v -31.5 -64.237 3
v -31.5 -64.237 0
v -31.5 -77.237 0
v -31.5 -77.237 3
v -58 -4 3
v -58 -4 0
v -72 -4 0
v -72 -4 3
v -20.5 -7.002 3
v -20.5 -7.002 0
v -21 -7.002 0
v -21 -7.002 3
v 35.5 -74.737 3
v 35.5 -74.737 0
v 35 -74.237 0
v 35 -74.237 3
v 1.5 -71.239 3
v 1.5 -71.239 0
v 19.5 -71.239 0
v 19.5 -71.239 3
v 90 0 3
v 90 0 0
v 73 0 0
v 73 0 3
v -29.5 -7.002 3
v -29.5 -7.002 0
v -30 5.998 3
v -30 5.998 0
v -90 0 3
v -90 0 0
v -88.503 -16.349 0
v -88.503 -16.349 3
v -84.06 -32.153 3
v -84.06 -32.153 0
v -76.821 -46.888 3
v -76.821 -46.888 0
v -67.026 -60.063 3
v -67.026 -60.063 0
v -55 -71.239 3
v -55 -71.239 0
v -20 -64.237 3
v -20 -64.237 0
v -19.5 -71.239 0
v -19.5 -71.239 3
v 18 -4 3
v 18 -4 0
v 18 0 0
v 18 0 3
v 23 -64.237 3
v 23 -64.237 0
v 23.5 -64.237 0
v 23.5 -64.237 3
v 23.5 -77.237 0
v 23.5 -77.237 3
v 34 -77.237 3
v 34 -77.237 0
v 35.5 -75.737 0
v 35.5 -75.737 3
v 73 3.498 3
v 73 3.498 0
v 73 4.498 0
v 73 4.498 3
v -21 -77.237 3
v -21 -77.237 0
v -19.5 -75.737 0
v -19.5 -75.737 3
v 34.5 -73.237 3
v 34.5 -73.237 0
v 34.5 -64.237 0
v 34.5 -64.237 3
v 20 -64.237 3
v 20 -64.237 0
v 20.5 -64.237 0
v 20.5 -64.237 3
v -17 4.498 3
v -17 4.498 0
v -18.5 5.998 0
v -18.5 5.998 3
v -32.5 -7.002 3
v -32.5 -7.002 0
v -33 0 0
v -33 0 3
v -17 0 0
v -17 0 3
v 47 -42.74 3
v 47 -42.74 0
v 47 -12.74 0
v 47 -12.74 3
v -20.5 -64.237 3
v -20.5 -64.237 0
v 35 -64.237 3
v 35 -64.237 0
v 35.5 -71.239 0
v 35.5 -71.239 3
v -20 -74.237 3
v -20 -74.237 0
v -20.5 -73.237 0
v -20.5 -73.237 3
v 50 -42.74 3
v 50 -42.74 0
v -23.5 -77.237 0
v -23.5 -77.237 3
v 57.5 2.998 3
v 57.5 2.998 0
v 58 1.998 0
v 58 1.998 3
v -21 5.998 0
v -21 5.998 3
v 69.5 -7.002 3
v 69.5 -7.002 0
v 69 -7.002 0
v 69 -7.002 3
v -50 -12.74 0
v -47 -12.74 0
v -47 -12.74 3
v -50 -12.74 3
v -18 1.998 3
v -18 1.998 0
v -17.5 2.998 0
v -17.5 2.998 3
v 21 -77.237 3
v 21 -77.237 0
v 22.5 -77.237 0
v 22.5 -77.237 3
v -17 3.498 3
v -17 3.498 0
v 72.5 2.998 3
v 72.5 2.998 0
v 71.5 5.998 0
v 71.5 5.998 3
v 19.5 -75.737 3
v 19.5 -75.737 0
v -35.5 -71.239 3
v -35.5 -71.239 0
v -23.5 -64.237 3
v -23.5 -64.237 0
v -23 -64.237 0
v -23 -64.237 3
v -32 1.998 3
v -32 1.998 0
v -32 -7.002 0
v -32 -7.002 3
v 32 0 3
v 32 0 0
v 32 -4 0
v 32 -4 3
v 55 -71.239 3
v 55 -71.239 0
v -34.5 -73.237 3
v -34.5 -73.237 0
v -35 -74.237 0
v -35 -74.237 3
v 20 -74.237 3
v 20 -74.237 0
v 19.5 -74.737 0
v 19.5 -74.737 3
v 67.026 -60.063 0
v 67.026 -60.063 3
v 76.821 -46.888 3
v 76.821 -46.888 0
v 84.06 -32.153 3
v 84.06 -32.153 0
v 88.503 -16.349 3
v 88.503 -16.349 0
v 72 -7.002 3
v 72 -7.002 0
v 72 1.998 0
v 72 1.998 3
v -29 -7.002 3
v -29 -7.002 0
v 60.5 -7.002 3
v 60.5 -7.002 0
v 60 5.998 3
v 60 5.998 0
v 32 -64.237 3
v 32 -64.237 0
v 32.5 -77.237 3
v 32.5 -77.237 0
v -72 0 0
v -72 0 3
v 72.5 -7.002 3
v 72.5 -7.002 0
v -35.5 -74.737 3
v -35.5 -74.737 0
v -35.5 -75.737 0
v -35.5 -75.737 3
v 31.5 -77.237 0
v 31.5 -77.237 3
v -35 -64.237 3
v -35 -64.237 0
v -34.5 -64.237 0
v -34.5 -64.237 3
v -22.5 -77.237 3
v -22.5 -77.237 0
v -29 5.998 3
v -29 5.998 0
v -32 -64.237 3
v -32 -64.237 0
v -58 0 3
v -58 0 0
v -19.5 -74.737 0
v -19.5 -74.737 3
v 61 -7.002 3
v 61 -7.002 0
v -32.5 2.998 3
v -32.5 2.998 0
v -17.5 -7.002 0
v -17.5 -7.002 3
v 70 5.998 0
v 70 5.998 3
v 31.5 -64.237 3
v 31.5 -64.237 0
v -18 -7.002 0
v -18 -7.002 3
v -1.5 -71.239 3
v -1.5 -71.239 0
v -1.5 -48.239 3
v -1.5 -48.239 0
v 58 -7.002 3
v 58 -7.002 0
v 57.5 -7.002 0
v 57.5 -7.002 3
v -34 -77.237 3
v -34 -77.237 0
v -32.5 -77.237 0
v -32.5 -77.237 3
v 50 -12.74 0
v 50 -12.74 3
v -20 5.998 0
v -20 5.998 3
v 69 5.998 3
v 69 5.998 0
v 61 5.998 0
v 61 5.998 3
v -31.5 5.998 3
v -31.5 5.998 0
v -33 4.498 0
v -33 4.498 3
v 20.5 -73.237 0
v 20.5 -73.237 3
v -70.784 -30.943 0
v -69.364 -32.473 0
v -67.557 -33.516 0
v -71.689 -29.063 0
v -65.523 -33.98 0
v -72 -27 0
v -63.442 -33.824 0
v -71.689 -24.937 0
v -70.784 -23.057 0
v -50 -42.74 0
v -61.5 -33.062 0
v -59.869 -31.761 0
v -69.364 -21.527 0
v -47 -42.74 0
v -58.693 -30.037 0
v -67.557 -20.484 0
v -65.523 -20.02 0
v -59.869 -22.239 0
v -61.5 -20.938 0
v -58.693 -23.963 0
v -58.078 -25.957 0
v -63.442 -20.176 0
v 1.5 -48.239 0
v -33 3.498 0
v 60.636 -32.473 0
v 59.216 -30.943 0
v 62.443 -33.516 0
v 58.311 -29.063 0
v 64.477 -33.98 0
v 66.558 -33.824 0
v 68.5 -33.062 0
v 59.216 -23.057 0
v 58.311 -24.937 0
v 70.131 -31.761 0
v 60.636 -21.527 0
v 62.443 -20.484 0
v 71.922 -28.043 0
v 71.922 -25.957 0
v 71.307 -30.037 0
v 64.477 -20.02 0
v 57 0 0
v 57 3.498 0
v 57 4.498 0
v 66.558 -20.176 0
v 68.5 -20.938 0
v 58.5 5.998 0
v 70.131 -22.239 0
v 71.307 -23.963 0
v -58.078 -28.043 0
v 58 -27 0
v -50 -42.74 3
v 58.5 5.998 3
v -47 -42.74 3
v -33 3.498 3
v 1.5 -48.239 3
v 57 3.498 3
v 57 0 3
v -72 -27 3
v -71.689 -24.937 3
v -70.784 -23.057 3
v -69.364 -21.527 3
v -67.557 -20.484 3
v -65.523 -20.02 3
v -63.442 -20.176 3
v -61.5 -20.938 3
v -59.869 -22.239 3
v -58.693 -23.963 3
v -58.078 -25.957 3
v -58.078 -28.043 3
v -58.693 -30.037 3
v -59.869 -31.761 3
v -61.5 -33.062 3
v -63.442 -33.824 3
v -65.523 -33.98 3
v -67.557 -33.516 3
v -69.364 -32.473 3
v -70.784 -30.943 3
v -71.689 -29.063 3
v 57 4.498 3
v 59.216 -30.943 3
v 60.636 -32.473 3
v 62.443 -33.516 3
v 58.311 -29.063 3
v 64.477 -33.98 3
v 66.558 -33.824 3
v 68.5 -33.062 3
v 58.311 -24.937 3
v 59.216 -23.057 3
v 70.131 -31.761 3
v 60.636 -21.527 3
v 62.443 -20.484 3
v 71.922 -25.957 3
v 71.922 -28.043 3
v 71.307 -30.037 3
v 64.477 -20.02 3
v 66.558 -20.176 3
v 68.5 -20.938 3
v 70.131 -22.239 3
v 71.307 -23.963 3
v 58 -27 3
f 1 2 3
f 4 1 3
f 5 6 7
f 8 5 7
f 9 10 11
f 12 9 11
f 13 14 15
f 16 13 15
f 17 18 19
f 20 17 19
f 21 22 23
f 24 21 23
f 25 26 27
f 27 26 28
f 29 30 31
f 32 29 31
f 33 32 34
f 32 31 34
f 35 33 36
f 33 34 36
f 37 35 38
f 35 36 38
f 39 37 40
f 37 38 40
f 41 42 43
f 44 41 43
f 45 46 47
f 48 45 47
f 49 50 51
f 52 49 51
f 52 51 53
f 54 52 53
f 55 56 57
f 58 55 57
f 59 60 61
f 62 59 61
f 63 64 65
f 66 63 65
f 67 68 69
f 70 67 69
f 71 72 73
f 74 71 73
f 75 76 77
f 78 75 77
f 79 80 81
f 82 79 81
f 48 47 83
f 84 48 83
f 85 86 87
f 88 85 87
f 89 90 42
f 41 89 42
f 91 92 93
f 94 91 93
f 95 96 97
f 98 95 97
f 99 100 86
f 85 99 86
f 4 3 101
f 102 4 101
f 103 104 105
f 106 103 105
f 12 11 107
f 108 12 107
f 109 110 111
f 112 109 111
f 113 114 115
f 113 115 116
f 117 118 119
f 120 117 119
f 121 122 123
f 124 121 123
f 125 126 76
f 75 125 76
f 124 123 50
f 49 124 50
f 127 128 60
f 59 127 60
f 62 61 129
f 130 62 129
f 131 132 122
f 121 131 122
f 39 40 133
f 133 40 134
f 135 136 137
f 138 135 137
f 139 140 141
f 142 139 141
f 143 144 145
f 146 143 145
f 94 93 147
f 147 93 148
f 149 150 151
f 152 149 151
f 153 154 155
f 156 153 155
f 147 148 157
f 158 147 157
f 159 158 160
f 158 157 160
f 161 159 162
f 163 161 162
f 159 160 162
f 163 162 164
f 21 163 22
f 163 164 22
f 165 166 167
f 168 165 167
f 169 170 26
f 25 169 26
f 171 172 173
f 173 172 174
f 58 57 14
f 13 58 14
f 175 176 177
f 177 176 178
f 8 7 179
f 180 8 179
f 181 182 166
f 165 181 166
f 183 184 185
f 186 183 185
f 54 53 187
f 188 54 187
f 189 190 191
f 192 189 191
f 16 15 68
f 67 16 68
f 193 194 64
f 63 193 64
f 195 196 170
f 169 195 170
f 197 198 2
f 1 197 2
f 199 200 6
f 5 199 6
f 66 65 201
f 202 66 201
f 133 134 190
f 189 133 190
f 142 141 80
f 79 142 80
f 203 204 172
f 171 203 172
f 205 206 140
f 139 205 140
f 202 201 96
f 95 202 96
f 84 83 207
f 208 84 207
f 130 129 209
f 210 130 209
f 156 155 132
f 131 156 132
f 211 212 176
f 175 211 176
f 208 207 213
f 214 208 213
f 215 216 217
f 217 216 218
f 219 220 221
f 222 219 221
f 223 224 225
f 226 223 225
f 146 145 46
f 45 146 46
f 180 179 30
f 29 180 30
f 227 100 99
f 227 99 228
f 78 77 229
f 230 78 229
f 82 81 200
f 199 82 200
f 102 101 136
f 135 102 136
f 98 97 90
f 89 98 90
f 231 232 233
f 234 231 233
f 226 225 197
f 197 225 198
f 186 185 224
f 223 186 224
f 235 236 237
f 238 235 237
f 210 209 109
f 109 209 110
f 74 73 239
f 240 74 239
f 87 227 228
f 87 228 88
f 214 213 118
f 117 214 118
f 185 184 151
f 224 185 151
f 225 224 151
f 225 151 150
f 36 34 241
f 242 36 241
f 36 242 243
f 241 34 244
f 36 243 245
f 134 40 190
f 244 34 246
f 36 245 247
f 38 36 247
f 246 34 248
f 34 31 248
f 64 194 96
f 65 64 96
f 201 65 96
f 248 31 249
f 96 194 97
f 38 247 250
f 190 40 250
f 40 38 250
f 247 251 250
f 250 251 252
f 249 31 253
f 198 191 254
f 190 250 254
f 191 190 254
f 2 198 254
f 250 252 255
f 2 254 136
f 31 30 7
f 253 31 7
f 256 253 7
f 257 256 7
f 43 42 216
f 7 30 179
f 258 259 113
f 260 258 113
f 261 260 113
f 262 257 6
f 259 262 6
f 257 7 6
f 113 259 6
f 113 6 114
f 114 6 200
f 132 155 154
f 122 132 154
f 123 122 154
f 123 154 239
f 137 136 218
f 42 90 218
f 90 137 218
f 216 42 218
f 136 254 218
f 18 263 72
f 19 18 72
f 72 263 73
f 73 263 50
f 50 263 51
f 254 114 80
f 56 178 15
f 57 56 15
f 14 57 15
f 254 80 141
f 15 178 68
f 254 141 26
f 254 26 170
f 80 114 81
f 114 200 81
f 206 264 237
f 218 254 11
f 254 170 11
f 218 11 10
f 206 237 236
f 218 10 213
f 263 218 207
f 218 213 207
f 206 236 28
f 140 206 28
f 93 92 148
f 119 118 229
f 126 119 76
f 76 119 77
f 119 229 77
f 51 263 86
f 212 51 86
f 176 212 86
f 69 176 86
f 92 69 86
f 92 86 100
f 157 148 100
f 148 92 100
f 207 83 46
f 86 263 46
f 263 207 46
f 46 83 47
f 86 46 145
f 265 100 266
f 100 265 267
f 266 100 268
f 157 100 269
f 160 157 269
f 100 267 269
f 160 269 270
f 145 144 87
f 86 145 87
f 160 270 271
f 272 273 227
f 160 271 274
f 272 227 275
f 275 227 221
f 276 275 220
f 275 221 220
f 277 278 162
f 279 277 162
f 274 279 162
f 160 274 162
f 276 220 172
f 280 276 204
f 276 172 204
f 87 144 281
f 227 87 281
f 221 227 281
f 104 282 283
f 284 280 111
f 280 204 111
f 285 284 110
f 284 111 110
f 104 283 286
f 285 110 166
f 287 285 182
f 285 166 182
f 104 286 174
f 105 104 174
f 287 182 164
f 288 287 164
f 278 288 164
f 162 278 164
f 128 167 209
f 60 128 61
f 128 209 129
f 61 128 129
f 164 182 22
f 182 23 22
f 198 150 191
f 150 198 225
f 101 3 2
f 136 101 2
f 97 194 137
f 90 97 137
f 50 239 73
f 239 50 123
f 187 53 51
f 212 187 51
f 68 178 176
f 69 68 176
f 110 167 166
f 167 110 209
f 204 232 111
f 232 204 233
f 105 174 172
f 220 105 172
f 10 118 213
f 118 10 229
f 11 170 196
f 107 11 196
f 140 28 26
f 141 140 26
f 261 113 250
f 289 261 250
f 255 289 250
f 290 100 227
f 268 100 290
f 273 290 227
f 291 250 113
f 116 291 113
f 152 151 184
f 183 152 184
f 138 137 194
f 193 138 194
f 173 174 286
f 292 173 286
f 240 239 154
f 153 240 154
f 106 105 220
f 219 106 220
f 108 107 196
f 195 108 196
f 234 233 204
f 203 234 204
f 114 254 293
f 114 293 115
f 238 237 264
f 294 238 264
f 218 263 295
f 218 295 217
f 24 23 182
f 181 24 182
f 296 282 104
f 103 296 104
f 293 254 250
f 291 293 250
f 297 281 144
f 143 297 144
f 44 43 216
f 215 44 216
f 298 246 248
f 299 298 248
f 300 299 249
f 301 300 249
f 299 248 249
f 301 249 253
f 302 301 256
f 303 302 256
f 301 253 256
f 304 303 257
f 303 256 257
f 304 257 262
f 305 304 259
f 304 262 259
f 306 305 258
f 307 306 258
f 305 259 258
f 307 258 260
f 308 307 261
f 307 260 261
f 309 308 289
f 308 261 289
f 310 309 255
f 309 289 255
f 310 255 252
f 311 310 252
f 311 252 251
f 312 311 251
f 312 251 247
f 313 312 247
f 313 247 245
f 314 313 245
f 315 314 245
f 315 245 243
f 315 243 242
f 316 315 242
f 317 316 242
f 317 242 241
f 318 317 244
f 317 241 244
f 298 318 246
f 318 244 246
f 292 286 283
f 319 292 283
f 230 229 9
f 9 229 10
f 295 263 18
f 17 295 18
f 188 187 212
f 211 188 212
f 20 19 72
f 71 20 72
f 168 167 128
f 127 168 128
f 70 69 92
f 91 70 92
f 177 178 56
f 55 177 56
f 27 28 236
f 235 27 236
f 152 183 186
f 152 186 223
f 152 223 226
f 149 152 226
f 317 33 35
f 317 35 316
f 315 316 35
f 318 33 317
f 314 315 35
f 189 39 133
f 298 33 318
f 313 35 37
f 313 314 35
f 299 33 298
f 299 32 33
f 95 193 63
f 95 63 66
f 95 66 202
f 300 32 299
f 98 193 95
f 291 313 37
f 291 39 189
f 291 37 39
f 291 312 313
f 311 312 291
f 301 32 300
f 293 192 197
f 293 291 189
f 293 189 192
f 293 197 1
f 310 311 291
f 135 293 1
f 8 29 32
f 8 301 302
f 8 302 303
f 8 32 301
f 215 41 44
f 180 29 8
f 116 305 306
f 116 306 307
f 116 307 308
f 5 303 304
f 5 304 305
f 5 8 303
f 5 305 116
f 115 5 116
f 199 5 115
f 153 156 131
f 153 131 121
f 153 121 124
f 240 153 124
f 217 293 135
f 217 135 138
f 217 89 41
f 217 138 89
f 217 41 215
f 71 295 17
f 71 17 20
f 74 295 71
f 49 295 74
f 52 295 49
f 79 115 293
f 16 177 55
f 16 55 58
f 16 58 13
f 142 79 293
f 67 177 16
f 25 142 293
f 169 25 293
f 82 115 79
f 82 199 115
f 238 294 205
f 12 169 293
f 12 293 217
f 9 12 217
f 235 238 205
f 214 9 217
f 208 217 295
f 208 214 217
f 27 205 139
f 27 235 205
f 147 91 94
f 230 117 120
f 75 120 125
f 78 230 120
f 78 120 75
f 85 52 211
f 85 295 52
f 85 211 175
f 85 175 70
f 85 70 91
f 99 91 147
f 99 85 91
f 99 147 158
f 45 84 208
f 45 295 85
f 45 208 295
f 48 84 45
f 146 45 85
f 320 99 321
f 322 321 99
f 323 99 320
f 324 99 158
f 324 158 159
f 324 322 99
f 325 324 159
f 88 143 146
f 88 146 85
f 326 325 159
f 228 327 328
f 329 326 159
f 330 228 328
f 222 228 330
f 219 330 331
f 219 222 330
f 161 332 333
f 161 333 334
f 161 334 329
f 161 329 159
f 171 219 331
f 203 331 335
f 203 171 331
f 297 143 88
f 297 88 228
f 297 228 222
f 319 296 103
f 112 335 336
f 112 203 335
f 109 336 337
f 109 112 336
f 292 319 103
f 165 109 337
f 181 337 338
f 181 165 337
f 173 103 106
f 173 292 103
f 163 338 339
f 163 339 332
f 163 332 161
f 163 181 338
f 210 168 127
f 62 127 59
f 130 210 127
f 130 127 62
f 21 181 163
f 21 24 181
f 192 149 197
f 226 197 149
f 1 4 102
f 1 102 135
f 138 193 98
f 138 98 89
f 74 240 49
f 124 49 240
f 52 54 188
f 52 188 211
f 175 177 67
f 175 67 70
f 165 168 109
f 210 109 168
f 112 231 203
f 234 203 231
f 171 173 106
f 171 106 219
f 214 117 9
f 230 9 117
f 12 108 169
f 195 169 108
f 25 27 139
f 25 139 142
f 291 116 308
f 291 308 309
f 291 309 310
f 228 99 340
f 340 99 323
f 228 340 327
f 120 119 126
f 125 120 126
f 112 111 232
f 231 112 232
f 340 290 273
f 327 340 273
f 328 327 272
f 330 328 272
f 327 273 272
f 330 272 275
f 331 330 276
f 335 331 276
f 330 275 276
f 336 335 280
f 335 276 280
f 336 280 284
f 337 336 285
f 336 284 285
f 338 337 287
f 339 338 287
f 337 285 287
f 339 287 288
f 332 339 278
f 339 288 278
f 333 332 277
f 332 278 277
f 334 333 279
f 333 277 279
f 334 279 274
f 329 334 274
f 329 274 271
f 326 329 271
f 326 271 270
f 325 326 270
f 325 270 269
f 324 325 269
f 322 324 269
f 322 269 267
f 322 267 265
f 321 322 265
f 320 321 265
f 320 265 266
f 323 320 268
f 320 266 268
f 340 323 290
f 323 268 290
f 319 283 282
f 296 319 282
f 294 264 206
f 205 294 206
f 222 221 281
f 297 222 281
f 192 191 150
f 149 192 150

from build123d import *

# Parameters (mm, degrees)
BOSS_EXTRUDE1_DEPTH     = 3
SKETCH5_W               = 3
SKETCH5_H               = 30
CUT_EXTRUDE3_DEPTH      = 3
SKETCH7_R               = 7
CUT_EXTRUDE4_DEPTH      = 3
CUT_EXTRUDE6_DEPTH      = 1
CUT_EXTRUDE6_DEPTH_BACK = 3


with BuildPart() as part:
    # Sketch1 → Boss-Extrude1 (new body)
    with BuildSketch(Plane.XY):
        with BuildLine():
            Line((-55, -71.239034244), (-35.5, -71.239034244))
            Line((-35.5, -71.239034244), (-35, -64.236863152))
            Line((-35, -64.236863152), (-34.5, -64.236863152))
            Line((-34.5, -64.236863152), (-34.5, -73.236863152))
            Line((-34.5, -73.236863152), (-35, -74.236863152))
            Line((-35, -74.236863152), (-35.5, -74.736863152))
            Line((-35.5, -74.736863152), (-35.5, -75.736863152))
            Line((-35.5, -75.736863152), (-34, -77.236863152))
            Line((-34, -77.236863152), (-32.5, -77.236863152))
            Line((-32.5, -77.236863152), (-32, -64.236863152))
            Line((-32, -64.236863152), (-31.5, -64.236863152))
            Line((-31.5, -64.236863152), (-31.5, -77.236863152))
            Line((-31.5, -77.236863152), (-23.5, -77.236863152))
            Line((-23.5, -77.236863152), (-23.5, -64.236863152))
            Line((-23.5, -64.236863152), (-23, -64.236863152))
            Line((-23, -64.236863152), (-22.5, -77.236863152))
            Line((-22.5, -77.236863152), (-21, -77.236863152))
            Line((-21, -77.236863152), (-19.5, -75.736863152))
            Line((-19.5, -75.736863152), (-19.5, -74.736863152))
            Line((-19.5, -74.736863152), (-20, -74.236863152))
            Line((-20, -74.236863152), (-20.5, -73.236863152))
            Line((-20.5, -73.236863152), (-20.5, -64.236863152))
            Line((-20.5, -64.236863152), (-20, -64.236863152))
            Line((-20, -64.236863152), (-19.5, -71.239034244))
            Line((-19.5, -71.239034244), (19.5, -71.239034244))
            Line((19.5, -71.239034244), (20, -64.236863152))
            Line((20, -64.236863152), (20.5, -64.236863152))
            Line((20.5, -64.236863152), (20.5, -73.236863152))
            Line((20.5, -73.236863152), (20, -74.236863152))
            Line((20, -74.236863152), (19.5, -74.736863152))
            Line((19.5, -74.736863152), (19.5, -75.736863152))
            Line((19.5, -75.736863152), (21, -77.236863152))
            Line((21, -77.236863152), (22.5, -77.236863152))
            Line((22.5, -77.236863152), (23, -64.236863152))
            Line((23, -64.236863152), (23.5, -64.236863152))
            Line((23.5, -64.236863152), (23.5, -77.236863152))
            Line((23.5, -77.236863152), (31.5, -77.236863152))
            Line((31.5, -77.236863152), (31.5, -64.236863152))
            Line((31.5, -64.236863152), (32, -64.236863152))
            Line((32, -64.236863152), (32.5, -77.236863152))
            Line((32.5, -77.236863152), (34, -77.236863152))
            Line((34, -77.236863152), (35.5, -75.736863152))
            Line((35.5, -75.736863152), (35.5, -74.736863152))
            Line((35.5, -74.736863152), (35, -74.236863152))
            Line((35, -74.236863152), (34.5, -73.236863152))
            Line((34.5, -73.236863152), (34.5, -64.236863152))
            Line((34.5, -64.236863152), (35, -64.236863152))
            Line((35, -64.236863152), (35.5, -71.239034244))
            Line((35.5, -71.239034244), (55, -71.239034244))
            ThreePointArc((55, -71.239034244), (80.777472107, -39.686269666), (90, 0))
            Line((90, 0), (73, 0))
            Line((73, 0), (72.5, -7.002171092))
            Line((72.5, -7.002171092), (72, -7.002171092))
            Line((72, -7.002171092), (72, 1.997828908))
            Line((72, 1.997828908), (72.5, 2.997828908))
            Line((72.5, 2.997828908), (73, 3.497828908))
            Line((73, 3.497828908), (73, 4.497828908))
            Line((73, 4.497828908), (71.5, 5.997828908))
            Line((71.5, 5.997828908), (70, 5.997828908))
            Line((70, 5.997828908), (69.5, -7.002171092))
            Line((69.5, -7.002171092), (69, -7.002171092))
            Line((69, -7.002171092), (69, 5.997828908))
            Line((69, 5.997828908), (61, 5.997828908))
            Line((61, 5.997828908), (61, -7.002171092))
            Line((61, -7.002171092), (60.5, -7.002171092))
            Line((60.5, -7.002171092), (60, 5.997828908))
            Line((60, 5.997828908), (58.5, 5.997828908))
            Line((58.5, 5.997828908), (57, 4.497828908))
            Line((57, 4.497828908), (57, 3.497828908))
            Line((57, 3.497828908), (57.5, 2.997828908))
            Line((57.5, 2.997828908), (58, 1.997828908))
            Line((58, 1.997828908), (58, -7.002171092))
            Line((58, -7.002171092), (57.5, -7.002171092))
            Line((57.5, -7.002171092), (57, 0))
            Line((57, 0), (32, 0))
            Line((32, 0), (32, -4))
            Line((32, -4), (18, -4))
            Line((18, -4), (18, 0))
            Line((18, 0), (-17, 0))
            Line((-17, 0), (-17.5, -7.002171092))
            Line((-17.5, -7.002171092), (-18, -7.002171092))
            Line((-18, -7.002171092), (-18, 1.997828908))
            Line((-18, 1.997828908), (-17.5, 2.997828908))
            Line((-17.5, 2.997828908), (-17, 3.497828908))
            Line((-17, 3.497828908), (-17, 4.497828908))
            Line((-17, 4.497828908), (-18.5, 5.997828908))
            Line((-18.5, 5.997828908), (-20, 5.997828908))
            Line((-20, 5.997828908), (-20.5, -7.002171092))
            Line((-20.5, -7.002171092), (-21, -7.002171092))
            Line((-21, -7.002171092), (-21, 5.997828908))
            Line((-21, 5.997828908), (-29, 5.997828908))
            Line((-29, 5.997828908), (-29, -7.002171092))
            Line((-29, -7.002171092), (-29.5, -7.002171092))
            Line((-29.5, -7.002171092), (-30, 5.997828908))
            Line((-30, 5.997828908), (-31.5, 5.997828908))
            Line((-31.5, 5.997828908), (-33, 4.497828908))
            Line((-33, 4.497828908), (-33, 3.497828908))
            Line((-33, 3.497828908), (-32.5, 2.997828908))
            Line((-32.5, 2.997828908), (-32, 1.997828908))
            Line((-32, 1.997828908), (-32, -7.002171092))
            Line((-32, -7.002171092), (-32.5, -7.002171092))
            Line((-32.5, -7.002171092), (-33, 0))
            Line((-33, 0), (-58, 0))
            Line((-58, 0), (-58, -4))
            Line((-58, -4), (-72, -4))
            Line((-72, -4), (-72, 0))
            Line((-72, 0), (-90, 0))
            ThreePointArc((-90, 0), (-80.777472107, -39.686269666), (-55, -71.239034244))
        make_face()
    extrude(amount=BOSS_EXTRUDE1_DEPTH)

    # Sketch5 → Cut-Extrude3 (cut)
    with BuildSketch(Plane(origin=(0, 0, 0), x_dir=(-1, 0, 0), z_dir=(0, 0, -1))):
        with Locations((-48.5, -27.74)):
            Rectangle(SKETCH5_W, SKETCH5_H)
        with Locations((48.5, -27.74)):
            Rectangle(SKETCH5_W, SKETCH5_H)
    extrude(amount=-CUT_EXTRUDE3_DEPTH, mode=Mode.SUBTRACT)

    # Sketch7 → Cut-Extrude4 (cut)
    with BuildSketch(Plane(origin=(0, 0, 0), x_dir=(-1, 0, 0), z_dir=(0, 0, -1))):
        with Locations((65, -27)):
            Circle(SKETCH7_R)
        with Locations((-65, -27)):
            Circle(SKETCH7_R)
    extrude(amount=-CUT_EXTRUDE4_DEPTH, mode=Mode.SUBTRACT)

    # Sketch8 → Cut-Extrude6 (cut, two sides)
    with BuildSketch(Plane(origin=(0, 0, 0), x_dir=(-1, 0, 0), z_dir=(0, 0, -1))) as cut_extrude6_sk:
        Polygon((-1.5, -320.719998244), (-1.5, -71.239034244), (-1.5, -48.239034244), (1.5, -48.239034244), (1.5, -71.239034244), (1.5, -320.719998244), (1.5, -819.681926243), (-1.5, -819.681926243), align=None)
    extrude(amount=CUT_EXTRUDE6_DEPTH, mode=Mode.SUBTRACT)
    extrude(cut_extrude6_sk.sketch, amount=-CUT_EXTRUDE6_DEPTH_BACK, mode=Mode.SUBTRACT)


solid = part.part
